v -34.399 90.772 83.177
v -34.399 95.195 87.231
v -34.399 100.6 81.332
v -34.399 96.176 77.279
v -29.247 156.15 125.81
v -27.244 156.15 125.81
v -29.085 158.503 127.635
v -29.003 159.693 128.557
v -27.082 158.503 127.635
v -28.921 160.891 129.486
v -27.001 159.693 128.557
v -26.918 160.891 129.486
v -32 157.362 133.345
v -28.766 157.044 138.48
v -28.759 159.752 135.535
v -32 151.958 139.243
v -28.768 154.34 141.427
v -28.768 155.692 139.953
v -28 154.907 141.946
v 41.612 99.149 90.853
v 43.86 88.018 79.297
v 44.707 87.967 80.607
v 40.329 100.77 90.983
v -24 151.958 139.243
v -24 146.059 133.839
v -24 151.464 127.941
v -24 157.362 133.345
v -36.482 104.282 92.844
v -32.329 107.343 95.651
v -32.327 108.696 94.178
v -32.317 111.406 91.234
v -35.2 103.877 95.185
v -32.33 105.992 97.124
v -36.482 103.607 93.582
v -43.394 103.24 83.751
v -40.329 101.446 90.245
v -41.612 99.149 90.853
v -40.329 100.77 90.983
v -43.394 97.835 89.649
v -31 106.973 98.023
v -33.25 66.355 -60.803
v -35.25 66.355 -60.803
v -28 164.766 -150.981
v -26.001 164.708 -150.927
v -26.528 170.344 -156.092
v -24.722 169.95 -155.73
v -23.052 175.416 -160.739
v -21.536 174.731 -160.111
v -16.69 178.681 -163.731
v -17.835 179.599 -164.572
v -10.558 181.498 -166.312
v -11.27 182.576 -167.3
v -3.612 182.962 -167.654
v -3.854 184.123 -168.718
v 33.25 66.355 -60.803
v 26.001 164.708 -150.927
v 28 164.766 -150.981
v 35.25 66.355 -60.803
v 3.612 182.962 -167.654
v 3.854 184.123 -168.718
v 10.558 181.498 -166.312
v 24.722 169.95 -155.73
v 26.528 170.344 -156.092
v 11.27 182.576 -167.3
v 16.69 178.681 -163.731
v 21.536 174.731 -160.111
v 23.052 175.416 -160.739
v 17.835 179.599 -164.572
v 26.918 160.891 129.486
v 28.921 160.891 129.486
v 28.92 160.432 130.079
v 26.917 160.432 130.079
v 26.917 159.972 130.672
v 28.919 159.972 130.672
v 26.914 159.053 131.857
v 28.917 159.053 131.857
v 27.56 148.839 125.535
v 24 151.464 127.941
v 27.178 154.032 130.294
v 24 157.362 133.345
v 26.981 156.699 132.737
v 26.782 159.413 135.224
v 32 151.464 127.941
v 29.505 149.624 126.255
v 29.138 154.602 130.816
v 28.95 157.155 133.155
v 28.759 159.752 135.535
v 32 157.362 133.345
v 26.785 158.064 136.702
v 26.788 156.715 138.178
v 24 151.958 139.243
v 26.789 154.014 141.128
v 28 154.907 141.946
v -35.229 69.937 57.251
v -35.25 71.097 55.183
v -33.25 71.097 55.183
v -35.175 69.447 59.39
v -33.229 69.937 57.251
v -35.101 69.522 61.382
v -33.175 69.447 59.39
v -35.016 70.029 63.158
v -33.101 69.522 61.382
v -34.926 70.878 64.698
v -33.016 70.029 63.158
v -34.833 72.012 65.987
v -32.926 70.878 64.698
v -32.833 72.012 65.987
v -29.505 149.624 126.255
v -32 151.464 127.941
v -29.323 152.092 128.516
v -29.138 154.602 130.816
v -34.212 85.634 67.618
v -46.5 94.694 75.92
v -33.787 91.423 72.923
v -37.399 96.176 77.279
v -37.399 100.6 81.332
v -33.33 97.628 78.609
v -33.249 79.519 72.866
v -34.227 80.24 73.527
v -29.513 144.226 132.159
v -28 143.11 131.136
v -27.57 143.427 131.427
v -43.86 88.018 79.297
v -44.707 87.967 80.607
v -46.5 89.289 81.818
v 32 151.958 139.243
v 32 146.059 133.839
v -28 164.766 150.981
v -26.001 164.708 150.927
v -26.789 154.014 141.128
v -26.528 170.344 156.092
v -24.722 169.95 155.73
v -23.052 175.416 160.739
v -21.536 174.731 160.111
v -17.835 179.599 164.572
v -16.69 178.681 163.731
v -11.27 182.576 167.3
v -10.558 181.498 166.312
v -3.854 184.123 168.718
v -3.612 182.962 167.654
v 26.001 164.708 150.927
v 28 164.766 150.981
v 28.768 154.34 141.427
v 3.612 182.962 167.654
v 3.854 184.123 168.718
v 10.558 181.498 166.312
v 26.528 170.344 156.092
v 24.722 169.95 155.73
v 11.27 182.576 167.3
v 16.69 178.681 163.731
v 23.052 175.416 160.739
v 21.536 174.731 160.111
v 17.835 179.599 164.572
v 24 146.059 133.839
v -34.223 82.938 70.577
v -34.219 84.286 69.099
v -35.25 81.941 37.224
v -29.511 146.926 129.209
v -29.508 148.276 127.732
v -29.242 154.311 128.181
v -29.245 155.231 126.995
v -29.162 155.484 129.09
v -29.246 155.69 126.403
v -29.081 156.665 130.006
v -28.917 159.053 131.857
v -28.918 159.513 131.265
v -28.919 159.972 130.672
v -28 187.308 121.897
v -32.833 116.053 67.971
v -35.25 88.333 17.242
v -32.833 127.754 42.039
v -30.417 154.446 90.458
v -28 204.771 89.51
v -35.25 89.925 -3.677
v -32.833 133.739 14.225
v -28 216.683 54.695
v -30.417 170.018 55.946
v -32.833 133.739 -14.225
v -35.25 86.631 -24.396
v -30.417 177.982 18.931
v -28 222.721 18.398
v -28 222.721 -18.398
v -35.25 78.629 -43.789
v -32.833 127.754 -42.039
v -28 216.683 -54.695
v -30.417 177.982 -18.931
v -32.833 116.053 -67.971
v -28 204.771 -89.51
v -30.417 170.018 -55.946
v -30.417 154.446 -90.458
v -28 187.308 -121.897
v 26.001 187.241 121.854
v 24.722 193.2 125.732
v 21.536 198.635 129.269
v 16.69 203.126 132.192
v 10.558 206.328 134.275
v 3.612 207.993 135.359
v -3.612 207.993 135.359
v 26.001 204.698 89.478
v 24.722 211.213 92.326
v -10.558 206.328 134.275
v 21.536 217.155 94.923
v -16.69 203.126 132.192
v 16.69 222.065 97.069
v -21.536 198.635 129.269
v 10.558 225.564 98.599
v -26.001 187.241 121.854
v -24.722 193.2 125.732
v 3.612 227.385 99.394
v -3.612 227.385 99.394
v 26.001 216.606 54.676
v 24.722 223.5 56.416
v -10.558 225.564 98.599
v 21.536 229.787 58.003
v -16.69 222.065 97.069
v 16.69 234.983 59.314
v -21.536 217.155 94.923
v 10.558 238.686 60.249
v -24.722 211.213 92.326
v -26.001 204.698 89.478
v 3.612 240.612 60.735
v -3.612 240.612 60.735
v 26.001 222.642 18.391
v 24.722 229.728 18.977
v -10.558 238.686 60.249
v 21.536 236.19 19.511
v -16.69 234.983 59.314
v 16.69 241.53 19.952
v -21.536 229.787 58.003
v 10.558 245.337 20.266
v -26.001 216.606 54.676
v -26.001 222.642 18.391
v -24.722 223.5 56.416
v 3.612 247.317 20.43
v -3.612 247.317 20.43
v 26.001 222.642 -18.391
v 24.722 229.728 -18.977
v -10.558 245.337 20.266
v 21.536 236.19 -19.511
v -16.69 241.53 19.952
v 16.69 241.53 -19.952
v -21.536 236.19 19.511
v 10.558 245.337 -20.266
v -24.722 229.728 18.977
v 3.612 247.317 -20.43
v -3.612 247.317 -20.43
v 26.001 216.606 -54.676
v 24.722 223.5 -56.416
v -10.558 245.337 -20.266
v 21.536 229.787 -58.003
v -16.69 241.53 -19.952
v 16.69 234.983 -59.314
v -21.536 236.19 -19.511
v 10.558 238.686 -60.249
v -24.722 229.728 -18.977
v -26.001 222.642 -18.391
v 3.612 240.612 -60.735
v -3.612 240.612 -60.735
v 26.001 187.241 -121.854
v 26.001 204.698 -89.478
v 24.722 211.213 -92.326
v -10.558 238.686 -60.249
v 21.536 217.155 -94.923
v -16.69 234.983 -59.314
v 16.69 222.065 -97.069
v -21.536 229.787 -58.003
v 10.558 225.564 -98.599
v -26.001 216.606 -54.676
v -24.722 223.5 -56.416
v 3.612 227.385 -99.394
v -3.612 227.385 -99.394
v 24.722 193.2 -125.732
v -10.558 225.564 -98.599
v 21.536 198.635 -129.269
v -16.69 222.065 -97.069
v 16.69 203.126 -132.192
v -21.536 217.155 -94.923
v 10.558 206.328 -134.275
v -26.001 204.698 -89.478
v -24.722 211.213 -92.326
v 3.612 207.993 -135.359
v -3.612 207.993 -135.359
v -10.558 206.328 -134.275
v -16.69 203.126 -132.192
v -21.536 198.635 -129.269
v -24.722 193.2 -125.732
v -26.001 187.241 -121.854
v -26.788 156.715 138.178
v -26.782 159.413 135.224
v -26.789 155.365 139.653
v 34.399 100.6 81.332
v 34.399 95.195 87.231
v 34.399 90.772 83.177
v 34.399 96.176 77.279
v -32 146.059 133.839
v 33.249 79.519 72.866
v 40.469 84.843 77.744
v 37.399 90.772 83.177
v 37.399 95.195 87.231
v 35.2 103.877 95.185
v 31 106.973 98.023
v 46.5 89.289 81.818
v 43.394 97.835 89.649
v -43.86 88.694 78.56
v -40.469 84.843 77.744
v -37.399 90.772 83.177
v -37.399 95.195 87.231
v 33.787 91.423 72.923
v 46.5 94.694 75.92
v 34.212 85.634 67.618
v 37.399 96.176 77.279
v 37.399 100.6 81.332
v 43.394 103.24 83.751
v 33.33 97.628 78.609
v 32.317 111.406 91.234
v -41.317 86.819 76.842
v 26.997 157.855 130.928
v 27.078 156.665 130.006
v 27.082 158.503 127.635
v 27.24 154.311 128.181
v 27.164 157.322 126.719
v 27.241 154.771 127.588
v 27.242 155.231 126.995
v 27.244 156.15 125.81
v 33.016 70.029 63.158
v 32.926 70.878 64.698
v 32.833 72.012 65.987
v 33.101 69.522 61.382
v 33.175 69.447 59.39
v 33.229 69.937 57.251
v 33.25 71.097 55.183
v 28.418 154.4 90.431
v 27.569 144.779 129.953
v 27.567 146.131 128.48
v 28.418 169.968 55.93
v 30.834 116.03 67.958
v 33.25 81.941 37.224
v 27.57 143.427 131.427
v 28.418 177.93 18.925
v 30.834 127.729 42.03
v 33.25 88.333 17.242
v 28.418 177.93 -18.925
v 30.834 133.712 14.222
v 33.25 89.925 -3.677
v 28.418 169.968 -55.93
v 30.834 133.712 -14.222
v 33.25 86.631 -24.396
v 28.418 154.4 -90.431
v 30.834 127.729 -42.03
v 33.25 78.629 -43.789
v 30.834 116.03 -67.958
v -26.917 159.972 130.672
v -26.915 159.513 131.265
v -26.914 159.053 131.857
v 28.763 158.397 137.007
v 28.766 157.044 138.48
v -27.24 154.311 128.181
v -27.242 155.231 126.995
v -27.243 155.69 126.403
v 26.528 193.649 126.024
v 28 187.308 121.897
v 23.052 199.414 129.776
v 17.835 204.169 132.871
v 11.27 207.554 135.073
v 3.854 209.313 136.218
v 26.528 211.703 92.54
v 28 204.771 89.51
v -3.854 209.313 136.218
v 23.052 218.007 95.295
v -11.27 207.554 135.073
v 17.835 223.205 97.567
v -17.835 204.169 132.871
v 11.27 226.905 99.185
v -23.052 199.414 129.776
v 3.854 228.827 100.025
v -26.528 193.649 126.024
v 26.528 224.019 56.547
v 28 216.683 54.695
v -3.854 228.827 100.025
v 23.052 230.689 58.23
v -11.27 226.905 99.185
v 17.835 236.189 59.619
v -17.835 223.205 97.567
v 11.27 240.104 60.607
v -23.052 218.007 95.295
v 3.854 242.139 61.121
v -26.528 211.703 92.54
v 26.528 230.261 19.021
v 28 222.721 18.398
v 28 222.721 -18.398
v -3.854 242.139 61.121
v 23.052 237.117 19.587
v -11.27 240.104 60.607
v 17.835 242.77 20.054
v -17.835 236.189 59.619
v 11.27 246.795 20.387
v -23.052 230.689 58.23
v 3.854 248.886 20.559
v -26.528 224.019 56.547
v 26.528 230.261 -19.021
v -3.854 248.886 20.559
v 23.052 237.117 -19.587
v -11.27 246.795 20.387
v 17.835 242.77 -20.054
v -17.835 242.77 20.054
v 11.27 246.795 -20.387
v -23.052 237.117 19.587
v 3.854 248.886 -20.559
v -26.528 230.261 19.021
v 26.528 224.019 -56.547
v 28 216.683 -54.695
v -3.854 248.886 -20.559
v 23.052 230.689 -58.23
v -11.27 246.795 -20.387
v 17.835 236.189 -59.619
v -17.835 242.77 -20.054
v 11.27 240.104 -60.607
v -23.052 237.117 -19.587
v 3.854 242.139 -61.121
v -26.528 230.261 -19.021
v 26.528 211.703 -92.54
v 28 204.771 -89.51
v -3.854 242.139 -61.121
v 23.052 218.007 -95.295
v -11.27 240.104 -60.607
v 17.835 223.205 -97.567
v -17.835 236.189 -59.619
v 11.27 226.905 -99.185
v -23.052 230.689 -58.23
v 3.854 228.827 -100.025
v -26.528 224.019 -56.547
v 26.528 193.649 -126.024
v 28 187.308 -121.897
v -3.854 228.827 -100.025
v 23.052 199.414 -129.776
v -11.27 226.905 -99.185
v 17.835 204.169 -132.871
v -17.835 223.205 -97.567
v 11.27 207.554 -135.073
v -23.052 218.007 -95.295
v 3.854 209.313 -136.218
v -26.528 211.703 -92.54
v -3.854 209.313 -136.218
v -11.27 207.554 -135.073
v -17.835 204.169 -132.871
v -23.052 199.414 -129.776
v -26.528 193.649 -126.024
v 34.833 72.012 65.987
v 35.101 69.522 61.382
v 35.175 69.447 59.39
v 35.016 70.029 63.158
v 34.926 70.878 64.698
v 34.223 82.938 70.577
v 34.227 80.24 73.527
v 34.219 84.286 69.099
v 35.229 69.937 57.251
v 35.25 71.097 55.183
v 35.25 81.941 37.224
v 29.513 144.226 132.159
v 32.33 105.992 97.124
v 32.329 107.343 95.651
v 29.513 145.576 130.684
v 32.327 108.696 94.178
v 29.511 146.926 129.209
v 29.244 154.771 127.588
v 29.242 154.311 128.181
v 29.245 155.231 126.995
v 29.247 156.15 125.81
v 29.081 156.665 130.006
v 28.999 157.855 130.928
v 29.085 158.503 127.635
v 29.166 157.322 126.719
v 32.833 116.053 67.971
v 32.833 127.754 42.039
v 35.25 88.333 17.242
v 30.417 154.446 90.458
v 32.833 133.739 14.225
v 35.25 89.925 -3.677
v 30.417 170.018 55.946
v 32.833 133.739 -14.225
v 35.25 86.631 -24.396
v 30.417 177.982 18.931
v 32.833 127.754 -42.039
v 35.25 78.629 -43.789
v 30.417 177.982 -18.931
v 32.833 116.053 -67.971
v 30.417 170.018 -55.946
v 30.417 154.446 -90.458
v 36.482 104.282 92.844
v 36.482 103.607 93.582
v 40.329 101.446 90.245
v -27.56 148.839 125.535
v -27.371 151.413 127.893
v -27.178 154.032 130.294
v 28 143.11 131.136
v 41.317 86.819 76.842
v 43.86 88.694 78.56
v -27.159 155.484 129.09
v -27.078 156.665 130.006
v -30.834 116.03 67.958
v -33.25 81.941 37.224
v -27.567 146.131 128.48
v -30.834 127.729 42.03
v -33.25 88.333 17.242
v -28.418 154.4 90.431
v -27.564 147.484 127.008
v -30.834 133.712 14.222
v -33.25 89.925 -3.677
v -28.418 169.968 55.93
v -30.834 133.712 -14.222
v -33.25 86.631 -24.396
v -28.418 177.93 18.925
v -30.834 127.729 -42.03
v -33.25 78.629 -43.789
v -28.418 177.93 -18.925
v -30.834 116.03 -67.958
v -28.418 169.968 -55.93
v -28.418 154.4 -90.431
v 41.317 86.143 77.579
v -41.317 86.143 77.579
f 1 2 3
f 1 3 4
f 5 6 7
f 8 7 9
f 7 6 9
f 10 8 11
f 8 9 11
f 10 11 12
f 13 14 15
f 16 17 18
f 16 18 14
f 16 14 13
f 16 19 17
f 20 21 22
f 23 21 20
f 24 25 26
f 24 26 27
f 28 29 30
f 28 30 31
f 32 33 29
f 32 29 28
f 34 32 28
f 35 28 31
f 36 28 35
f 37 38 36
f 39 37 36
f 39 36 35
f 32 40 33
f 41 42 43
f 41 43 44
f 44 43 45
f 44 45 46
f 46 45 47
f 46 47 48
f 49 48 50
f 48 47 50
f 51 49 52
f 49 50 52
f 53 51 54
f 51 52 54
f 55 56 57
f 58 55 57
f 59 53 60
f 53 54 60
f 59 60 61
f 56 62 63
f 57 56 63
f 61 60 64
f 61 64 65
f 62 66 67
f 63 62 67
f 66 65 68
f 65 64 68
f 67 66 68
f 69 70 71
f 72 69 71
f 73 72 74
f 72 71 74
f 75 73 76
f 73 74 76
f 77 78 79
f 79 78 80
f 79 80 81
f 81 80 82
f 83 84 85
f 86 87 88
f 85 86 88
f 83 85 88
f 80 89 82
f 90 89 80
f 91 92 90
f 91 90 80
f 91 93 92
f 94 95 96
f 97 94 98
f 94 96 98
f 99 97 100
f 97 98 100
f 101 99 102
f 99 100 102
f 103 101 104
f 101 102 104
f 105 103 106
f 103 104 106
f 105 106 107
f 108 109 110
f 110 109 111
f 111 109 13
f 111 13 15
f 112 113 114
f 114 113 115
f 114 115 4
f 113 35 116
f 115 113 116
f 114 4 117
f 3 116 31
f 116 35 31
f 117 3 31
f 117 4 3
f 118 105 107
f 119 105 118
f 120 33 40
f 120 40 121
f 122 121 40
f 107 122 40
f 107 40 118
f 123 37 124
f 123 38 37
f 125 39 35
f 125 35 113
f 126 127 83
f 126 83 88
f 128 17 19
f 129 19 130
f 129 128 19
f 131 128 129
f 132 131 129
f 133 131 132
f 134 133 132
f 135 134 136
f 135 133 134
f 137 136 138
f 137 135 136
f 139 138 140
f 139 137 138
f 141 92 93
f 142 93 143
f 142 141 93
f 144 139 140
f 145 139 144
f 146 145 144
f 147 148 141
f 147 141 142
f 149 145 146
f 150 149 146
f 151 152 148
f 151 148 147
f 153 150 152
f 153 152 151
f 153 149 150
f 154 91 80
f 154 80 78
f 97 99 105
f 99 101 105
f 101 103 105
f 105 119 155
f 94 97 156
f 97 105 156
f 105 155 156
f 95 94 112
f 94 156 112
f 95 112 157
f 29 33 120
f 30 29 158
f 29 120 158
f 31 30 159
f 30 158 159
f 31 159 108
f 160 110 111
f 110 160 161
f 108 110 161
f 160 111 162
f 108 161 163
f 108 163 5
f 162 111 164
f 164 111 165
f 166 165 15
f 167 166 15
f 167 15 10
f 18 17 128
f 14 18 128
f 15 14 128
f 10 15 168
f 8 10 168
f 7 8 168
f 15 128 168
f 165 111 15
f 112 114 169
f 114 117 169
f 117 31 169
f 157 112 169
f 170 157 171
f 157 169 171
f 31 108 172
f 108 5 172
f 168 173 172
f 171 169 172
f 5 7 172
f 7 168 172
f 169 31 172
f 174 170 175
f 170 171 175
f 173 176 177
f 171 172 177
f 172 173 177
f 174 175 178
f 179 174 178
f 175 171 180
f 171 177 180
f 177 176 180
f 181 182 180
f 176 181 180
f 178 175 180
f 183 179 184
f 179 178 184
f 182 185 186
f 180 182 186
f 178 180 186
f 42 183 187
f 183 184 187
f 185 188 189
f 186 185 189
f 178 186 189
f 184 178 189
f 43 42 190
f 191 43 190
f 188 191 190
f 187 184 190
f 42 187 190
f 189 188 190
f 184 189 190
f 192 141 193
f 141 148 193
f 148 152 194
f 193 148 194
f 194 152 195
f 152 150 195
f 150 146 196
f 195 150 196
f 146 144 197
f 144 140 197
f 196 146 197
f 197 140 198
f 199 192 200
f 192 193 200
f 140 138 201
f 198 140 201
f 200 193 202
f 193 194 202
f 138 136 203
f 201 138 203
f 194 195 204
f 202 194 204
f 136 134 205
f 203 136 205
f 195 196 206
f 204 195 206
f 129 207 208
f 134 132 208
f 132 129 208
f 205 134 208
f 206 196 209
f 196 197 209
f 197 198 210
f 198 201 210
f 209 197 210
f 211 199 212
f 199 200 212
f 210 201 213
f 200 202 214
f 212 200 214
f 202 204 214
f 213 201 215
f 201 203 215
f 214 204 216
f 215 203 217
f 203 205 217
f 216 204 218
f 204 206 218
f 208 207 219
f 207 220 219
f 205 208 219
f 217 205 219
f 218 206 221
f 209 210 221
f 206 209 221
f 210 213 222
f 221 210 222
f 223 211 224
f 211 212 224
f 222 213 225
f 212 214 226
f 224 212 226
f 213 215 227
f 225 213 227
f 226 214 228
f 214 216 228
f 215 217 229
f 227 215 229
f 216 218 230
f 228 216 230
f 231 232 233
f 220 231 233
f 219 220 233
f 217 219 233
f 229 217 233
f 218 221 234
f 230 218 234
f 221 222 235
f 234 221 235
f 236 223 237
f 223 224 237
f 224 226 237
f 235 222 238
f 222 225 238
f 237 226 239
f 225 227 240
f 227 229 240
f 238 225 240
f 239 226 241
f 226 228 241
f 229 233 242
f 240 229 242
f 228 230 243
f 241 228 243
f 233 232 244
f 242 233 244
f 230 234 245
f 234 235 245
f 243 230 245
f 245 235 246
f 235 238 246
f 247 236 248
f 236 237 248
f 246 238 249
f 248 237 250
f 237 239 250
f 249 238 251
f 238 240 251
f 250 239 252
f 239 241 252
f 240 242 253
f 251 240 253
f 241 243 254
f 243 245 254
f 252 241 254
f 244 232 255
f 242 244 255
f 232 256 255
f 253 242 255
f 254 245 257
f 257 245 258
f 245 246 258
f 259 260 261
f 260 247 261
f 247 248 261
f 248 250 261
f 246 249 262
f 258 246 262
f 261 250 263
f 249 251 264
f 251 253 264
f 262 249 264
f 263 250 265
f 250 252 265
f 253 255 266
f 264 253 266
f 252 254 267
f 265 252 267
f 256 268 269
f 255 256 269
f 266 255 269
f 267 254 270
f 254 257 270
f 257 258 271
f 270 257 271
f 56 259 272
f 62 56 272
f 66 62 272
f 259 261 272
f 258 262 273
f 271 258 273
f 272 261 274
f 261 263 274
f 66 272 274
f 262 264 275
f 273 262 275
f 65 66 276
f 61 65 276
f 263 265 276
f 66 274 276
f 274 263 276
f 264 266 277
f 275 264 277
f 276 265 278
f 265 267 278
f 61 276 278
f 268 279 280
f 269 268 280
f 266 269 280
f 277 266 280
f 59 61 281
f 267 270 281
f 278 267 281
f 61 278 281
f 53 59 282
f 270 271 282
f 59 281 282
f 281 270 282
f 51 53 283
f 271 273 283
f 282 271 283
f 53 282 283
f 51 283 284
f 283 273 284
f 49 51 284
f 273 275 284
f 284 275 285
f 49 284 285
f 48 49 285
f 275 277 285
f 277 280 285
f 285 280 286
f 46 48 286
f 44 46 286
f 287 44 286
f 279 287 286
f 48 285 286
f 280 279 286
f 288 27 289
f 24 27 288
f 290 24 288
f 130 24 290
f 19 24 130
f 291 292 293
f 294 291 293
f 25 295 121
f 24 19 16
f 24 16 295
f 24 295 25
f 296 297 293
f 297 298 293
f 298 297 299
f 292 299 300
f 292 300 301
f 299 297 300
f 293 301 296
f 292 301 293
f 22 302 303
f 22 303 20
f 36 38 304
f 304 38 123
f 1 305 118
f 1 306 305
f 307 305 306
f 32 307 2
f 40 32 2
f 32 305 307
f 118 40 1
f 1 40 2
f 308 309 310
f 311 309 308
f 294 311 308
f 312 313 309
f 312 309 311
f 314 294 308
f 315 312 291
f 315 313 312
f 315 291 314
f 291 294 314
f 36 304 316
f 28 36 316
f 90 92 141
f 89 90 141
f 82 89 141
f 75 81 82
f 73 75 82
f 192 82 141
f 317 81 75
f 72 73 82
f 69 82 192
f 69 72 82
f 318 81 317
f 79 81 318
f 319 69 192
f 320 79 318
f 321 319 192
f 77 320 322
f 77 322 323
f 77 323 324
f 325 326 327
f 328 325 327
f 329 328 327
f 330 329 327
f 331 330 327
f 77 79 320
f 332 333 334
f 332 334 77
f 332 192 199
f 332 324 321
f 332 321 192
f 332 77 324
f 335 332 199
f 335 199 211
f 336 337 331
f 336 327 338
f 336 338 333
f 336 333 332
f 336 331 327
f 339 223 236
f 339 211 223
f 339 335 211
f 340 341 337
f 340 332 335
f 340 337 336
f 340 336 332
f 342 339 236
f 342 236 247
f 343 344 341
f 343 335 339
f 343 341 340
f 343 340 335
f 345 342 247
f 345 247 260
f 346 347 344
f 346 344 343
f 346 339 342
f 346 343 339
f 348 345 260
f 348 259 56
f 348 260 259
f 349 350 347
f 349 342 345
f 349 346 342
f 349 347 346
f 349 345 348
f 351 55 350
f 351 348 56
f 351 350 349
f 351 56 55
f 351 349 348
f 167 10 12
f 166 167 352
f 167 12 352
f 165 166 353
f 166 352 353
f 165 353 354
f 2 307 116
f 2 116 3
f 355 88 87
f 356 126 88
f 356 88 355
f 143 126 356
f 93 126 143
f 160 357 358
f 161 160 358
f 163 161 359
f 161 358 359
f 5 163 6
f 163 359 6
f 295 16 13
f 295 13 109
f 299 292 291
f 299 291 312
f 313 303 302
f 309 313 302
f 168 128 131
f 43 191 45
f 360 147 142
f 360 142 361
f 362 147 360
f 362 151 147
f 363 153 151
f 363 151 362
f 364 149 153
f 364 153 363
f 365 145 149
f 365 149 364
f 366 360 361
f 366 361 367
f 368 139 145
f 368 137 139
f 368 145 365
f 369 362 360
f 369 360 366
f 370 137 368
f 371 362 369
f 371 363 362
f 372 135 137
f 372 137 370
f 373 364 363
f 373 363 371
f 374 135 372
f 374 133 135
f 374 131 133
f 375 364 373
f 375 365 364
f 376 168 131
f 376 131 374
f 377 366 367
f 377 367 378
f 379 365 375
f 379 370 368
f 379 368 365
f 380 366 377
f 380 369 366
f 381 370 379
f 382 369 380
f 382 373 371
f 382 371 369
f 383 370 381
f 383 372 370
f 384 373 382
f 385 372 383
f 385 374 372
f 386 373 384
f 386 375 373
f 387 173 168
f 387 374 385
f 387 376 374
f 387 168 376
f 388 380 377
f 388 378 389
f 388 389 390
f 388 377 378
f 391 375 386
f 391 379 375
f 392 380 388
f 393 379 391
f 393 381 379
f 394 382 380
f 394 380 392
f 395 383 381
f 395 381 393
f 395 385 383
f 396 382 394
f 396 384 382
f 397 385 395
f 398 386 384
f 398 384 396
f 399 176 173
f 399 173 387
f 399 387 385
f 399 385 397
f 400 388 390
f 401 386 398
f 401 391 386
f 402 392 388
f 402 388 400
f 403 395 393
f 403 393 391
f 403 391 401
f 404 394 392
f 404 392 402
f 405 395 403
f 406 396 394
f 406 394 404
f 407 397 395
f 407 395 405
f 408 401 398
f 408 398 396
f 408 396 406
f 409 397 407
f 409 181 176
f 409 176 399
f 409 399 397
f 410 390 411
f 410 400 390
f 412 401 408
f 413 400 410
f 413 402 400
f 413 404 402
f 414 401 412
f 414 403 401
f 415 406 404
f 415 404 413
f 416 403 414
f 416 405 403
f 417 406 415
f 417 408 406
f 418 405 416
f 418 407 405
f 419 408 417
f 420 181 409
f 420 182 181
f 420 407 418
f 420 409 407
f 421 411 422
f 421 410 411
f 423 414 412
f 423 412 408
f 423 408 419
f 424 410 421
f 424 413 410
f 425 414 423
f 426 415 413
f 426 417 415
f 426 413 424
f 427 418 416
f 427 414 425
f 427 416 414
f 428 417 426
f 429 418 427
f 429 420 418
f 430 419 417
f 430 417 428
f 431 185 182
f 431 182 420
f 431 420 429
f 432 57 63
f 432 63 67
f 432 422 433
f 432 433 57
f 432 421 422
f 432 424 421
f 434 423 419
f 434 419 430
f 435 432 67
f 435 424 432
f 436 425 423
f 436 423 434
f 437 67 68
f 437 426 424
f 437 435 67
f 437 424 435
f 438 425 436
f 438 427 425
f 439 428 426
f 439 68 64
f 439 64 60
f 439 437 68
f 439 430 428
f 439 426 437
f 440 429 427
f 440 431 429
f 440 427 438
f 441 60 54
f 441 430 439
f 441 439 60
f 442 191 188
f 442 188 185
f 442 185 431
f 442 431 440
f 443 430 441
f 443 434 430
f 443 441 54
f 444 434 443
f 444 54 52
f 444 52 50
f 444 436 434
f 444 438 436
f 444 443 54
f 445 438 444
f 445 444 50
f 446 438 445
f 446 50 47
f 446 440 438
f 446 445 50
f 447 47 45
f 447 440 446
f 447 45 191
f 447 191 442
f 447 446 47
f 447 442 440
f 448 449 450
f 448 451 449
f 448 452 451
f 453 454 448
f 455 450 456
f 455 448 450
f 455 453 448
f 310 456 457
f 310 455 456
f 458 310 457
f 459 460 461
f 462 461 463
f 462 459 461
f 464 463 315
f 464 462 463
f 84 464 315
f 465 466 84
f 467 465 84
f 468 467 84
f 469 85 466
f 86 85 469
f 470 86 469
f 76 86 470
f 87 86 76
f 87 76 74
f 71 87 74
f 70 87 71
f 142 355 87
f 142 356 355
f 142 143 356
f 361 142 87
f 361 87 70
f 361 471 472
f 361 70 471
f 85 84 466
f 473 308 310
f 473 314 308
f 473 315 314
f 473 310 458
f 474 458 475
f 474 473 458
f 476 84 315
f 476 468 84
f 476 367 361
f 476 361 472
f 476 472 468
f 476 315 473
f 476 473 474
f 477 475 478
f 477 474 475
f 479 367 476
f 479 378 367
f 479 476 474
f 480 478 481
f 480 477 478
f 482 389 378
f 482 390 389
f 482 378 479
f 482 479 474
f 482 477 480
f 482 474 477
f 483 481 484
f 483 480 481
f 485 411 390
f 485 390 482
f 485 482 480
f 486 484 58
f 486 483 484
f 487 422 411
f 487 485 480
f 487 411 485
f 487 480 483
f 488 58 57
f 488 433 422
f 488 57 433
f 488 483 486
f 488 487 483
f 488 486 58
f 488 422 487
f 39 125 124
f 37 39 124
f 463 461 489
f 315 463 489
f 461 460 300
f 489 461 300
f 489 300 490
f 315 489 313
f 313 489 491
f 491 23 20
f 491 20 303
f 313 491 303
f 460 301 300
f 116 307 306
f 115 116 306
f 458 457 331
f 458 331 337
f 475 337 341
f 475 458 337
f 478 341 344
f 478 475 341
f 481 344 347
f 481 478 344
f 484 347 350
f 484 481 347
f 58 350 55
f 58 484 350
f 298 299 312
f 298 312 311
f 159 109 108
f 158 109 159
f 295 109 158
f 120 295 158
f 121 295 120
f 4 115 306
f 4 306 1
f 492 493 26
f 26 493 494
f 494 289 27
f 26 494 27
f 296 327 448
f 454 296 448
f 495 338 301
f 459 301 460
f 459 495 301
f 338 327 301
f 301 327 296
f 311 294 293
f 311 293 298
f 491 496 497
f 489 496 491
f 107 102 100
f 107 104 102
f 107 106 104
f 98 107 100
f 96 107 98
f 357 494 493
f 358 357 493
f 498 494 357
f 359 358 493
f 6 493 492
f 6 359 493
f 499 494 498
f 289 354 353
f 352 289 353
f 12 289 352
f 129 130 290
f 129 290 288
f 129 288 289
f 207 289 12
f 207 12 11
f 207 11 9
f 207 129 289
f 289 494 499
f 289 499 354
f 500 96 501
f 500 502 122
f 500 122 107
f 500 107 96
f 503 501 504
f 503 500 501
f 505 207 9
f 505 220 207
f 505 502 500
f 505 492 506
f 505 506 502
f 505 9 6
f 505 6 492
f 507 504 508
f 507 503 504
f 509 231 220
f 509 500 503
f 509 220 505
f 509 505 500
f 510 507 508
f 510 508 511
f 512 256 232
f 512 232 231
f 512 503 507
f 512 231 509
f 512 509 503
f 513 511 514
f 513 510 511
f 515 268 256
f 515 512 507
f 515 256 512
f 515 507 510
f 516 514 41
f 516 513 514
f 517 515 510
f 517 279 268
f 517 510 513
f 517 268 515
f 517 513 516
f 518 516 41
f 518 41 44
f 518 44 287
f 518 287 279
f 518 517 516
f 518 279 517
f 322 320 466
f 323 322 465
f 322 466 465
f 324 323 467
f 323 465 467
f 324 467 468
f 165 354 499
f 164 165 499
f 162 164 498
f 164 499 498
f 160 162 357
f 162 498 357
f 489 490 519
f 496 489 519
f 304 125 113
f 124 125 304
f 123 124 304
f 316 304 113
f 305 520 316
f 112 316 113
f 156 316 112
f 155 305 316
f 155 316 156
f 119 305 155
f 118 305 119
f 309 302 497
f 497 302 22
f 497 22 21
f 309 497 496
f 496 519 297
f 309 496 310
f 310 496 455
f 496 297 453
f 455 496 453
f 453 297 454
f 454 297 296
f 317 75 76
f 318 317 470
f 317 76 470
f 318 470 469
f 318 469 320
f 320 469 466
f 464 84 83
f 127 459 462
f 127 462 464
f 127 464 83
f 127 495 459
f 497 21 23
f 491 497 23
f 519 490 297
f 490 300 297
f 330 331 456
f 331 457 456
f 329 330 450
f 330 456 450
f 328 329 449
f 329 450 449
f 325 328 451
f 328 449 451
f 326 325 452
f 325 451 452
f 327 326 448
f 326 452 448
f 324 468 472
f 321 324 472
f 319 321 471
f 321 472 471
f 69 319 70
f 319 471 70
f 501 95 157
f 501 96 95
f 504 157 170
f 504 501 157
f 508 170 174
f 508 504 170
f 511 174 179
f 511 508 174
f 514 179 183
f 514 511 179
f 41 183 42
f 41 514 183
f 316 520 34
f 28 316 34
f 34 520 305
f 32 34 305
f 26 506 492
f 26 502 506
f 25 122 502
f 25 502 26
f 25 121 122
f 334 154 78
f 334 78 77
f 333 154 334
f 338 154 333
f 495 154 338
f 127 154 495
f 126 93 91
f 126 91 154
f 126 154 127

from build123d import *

# Parameters (mm, degrees)
REVOLUTION_ANGLE = 85
FILLET_R         = 8
PAD_DEPTH        = 8
POCKET_DEPTH     = 2
CHAMFER_SIZE     = 1
SKETCH005_W      = 3
SKETCH005_H      = 7
POCKET001_DEPTH  = 87.696576
POCKET002_DEPTH  = 78.501
SKETCH007_W      = 3
SKETCH007_H      = 6
POCKET003_DEPTH  = 87.696576


with BuildPart() as part:
    # Sketch → Revolution (revolve, symmetric)
    with BuildSketch(Plane.XY) as revolution_sk:
        with BuildLine():
            ThreePointArc((28, 223.47956), (0, 250), (-28, 223.47956))
            Line((-35.25, 90), (-28, 223.47956))
            Line((-35.25, 90), (-33.25, 90))
            Line((-33.25, 90), (-26.001373, 223.4))
            ThreePointArc((26.001373, 223.4), (0, 248.411154), (-26.001373, 223.4))
            Line((26.001373, 223.4), (33.25, 90))
            Line((33.25, 90), (35.25, 90))
            Line((35.25, 90), (28, 223.47956))
        make_face()
    revolve(axis=Axis((0, 0, 0), (1, 0, 0)), revolution_arc=REVOLUTION_ANGLE / 2)
    revolve(revolution_sk.sketch, axis=Axis((0, 0, 0), (-1, 0, 0)), revolution_arc=REVOLUTION_ANGLE / 2)

    # Fillet
    fillet_edges = [part.edges().sort_by_distance(p)[0] for p in [
        (34.25, 66.35496, 60.803119),
        (-34.25, 66.35496, 60.803119),
    ]]
    fillet(fillet_edges, radius=FILLET_R)

    # Sketch002 (on Face5 of Fillet) → Pad (new body)
    with BuildSketch(Plane(origin=(0, 0, 0), x_dir=(1, 0, 0), z_dir=(0, -0.67559, 0.737277))):
        Polygon((-43.394171, 132.697505), (-46.5, 121.106395), (-33.248819, 107.855214), (-31, 145.091677), align=None)
        Polygon((43.394171, 132.697505), (46.5, 121.106395), (33.248819, 107.855214), (31, 145.091677), align=None)
        Polygon((28, 194.106395), (32, 198.106395), (32, 206.106395), (28, 210.106395), (24, 206.106395), (24, 198.106395), align=None)
        Polygon((-28, 194.106395), (-24, 198.106395), (-24, 206.106395), (-28, 210.106395), (-32, 206.106395), (-32, 198.106395), align=None)
    extrude(amount=-PAD_DEPTH)

    # Sketch003 (on Face47 of Pad) → Pocket (cut)
    with BuildSketch(Plane(origin=(0, 0, 0), x_dir=(1, 0, 0), z_dir=(0, -0.67559, 0.737277))):
        Polygon((35, 146.869795), (45, 97.88), (47.939388, 98.48), (37.939388, 147.469795), align=None)
        Polygon((-47.939388, 98.48), (-45, 97.88), (-35, 146.869795), (-37.939388, 147.469795), align=None)
    extrude(amount=-POCKET_DEPTH, mode=Mode.SUBTRACT)

    # Chamfer
    chamfer_edges = [part.edges().sort_by_distance(p)[0] for p in [
        (42.094426, 93.718526, 85.877207),
        (38.89944, 94.199359, 86.317809),
        (-38.89944, 94.199359, 86.317809),
        (-42.094426, 93.718526, 85.877207),
    ]]
    chamfer(chamfer_edges, length=CHAMFER_SIZE)

    # Sketch005 (on Face6 of Chamfer) → Pocket001 (cut, through all)
    with BuildSketch(Plane(origin=(0, 5.404722, -5.898219), x_dir=(1, 0, 0), z_dir=(0, 0.67559, -0.737277))):
        with Locations((-36.047712, 125.078524)):
            Rectangle(SKETCH005_W, SKETCH005_H)
        with Locations((36.047712, 125.078524)):
            Rectangle(SKETCH005_W, SKETCH005_H)
    extrude(amount=-POCKET001_DEPTH, mode=Mode.SUBTRACT)

    # Sketch006 → Pocket002 (cut, through all)
    with BuildSketch(Plane.YZ.offset(32)):
        Polygon((154.311436, 128.180853), (156.149665, 125.810007), (160.891358, 129.486466), (159.053128, 131.857312), align=None)
    extrude(amount=-POCKET002_DEPTH, mode=Mode.SUBTRACT)

    # Sketch007 (on Face6 of Pocket002) → Pocket003 (cut, through all)
    with BuildSketch(Plane(origin=(0, 5.404722, -5.898219), x_dir=(1, 0, 0), z_dir=(0, 0.67559, -0.737277))):
        with Locations((-35.898523, -126.117473)):
            Rectangle(SKETCH007_W, SKETCH007_H)
        with Locations((35.898523, -126.117473)):
            Rectangle(SKETCH007_W, SKETCH007_H)
    extrude(amount=-POCKET003_DEPTH, mode=Mode.SUBTRACT)


solid = part.part
